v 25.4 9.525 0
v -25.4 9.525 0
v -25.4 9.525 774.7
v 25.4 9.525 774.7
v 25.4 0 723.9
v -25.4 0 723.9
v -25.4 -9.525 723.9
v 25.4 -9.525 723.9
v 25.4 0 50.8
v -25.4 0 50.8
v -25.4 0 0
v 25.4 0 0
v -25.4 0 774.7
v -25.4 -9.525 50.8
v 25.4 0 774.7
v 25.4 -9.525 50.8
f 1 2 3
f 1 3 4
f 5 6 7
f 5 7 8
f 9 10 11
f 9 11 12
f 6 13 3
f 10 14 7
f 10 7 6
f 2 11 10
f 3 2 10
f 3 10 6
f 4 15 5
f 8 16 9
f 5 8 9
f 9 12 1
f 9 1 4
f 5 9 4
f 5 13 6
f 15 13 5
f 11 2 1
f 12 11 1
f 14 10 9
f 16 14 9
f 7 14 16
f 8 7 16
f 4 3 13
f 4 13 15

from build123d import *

# Parameters (mm, degrees)
F0_W     = 50.8
F0_H     = 19.05
F1_DEPTH = 774.7
F2_W     = 122.43557321
F2_H     = 50.8
F2_W_2   = 343.1604206562
F3_DEPTH = 25.4


# Not quite as in the source:
# - a feature names something its author has since deleted; it is built from what else it names


with BuildPart() as f1:
    # F0 (on Top) → F1 (new body)
    with BuildSketch(Plane.XY):
        Rectangle(F0_W, F0_H)
    extrude(amount=F1_DEPTH)

    # F2 (on Front) → F3 (cut)
    with BuildSketch(Plane.XZ):
        with Locations((22.4465244144, 25.4)):
            Rectangle(F2_W, F2_H)
        with Locations((-38.7818217278, 749.3)):
            Rectangle(F2_W_2, F2_H)
    extrude(amount=F3_DEPTH, mode=Mode.SUBTRACT)


solid = f1.part
